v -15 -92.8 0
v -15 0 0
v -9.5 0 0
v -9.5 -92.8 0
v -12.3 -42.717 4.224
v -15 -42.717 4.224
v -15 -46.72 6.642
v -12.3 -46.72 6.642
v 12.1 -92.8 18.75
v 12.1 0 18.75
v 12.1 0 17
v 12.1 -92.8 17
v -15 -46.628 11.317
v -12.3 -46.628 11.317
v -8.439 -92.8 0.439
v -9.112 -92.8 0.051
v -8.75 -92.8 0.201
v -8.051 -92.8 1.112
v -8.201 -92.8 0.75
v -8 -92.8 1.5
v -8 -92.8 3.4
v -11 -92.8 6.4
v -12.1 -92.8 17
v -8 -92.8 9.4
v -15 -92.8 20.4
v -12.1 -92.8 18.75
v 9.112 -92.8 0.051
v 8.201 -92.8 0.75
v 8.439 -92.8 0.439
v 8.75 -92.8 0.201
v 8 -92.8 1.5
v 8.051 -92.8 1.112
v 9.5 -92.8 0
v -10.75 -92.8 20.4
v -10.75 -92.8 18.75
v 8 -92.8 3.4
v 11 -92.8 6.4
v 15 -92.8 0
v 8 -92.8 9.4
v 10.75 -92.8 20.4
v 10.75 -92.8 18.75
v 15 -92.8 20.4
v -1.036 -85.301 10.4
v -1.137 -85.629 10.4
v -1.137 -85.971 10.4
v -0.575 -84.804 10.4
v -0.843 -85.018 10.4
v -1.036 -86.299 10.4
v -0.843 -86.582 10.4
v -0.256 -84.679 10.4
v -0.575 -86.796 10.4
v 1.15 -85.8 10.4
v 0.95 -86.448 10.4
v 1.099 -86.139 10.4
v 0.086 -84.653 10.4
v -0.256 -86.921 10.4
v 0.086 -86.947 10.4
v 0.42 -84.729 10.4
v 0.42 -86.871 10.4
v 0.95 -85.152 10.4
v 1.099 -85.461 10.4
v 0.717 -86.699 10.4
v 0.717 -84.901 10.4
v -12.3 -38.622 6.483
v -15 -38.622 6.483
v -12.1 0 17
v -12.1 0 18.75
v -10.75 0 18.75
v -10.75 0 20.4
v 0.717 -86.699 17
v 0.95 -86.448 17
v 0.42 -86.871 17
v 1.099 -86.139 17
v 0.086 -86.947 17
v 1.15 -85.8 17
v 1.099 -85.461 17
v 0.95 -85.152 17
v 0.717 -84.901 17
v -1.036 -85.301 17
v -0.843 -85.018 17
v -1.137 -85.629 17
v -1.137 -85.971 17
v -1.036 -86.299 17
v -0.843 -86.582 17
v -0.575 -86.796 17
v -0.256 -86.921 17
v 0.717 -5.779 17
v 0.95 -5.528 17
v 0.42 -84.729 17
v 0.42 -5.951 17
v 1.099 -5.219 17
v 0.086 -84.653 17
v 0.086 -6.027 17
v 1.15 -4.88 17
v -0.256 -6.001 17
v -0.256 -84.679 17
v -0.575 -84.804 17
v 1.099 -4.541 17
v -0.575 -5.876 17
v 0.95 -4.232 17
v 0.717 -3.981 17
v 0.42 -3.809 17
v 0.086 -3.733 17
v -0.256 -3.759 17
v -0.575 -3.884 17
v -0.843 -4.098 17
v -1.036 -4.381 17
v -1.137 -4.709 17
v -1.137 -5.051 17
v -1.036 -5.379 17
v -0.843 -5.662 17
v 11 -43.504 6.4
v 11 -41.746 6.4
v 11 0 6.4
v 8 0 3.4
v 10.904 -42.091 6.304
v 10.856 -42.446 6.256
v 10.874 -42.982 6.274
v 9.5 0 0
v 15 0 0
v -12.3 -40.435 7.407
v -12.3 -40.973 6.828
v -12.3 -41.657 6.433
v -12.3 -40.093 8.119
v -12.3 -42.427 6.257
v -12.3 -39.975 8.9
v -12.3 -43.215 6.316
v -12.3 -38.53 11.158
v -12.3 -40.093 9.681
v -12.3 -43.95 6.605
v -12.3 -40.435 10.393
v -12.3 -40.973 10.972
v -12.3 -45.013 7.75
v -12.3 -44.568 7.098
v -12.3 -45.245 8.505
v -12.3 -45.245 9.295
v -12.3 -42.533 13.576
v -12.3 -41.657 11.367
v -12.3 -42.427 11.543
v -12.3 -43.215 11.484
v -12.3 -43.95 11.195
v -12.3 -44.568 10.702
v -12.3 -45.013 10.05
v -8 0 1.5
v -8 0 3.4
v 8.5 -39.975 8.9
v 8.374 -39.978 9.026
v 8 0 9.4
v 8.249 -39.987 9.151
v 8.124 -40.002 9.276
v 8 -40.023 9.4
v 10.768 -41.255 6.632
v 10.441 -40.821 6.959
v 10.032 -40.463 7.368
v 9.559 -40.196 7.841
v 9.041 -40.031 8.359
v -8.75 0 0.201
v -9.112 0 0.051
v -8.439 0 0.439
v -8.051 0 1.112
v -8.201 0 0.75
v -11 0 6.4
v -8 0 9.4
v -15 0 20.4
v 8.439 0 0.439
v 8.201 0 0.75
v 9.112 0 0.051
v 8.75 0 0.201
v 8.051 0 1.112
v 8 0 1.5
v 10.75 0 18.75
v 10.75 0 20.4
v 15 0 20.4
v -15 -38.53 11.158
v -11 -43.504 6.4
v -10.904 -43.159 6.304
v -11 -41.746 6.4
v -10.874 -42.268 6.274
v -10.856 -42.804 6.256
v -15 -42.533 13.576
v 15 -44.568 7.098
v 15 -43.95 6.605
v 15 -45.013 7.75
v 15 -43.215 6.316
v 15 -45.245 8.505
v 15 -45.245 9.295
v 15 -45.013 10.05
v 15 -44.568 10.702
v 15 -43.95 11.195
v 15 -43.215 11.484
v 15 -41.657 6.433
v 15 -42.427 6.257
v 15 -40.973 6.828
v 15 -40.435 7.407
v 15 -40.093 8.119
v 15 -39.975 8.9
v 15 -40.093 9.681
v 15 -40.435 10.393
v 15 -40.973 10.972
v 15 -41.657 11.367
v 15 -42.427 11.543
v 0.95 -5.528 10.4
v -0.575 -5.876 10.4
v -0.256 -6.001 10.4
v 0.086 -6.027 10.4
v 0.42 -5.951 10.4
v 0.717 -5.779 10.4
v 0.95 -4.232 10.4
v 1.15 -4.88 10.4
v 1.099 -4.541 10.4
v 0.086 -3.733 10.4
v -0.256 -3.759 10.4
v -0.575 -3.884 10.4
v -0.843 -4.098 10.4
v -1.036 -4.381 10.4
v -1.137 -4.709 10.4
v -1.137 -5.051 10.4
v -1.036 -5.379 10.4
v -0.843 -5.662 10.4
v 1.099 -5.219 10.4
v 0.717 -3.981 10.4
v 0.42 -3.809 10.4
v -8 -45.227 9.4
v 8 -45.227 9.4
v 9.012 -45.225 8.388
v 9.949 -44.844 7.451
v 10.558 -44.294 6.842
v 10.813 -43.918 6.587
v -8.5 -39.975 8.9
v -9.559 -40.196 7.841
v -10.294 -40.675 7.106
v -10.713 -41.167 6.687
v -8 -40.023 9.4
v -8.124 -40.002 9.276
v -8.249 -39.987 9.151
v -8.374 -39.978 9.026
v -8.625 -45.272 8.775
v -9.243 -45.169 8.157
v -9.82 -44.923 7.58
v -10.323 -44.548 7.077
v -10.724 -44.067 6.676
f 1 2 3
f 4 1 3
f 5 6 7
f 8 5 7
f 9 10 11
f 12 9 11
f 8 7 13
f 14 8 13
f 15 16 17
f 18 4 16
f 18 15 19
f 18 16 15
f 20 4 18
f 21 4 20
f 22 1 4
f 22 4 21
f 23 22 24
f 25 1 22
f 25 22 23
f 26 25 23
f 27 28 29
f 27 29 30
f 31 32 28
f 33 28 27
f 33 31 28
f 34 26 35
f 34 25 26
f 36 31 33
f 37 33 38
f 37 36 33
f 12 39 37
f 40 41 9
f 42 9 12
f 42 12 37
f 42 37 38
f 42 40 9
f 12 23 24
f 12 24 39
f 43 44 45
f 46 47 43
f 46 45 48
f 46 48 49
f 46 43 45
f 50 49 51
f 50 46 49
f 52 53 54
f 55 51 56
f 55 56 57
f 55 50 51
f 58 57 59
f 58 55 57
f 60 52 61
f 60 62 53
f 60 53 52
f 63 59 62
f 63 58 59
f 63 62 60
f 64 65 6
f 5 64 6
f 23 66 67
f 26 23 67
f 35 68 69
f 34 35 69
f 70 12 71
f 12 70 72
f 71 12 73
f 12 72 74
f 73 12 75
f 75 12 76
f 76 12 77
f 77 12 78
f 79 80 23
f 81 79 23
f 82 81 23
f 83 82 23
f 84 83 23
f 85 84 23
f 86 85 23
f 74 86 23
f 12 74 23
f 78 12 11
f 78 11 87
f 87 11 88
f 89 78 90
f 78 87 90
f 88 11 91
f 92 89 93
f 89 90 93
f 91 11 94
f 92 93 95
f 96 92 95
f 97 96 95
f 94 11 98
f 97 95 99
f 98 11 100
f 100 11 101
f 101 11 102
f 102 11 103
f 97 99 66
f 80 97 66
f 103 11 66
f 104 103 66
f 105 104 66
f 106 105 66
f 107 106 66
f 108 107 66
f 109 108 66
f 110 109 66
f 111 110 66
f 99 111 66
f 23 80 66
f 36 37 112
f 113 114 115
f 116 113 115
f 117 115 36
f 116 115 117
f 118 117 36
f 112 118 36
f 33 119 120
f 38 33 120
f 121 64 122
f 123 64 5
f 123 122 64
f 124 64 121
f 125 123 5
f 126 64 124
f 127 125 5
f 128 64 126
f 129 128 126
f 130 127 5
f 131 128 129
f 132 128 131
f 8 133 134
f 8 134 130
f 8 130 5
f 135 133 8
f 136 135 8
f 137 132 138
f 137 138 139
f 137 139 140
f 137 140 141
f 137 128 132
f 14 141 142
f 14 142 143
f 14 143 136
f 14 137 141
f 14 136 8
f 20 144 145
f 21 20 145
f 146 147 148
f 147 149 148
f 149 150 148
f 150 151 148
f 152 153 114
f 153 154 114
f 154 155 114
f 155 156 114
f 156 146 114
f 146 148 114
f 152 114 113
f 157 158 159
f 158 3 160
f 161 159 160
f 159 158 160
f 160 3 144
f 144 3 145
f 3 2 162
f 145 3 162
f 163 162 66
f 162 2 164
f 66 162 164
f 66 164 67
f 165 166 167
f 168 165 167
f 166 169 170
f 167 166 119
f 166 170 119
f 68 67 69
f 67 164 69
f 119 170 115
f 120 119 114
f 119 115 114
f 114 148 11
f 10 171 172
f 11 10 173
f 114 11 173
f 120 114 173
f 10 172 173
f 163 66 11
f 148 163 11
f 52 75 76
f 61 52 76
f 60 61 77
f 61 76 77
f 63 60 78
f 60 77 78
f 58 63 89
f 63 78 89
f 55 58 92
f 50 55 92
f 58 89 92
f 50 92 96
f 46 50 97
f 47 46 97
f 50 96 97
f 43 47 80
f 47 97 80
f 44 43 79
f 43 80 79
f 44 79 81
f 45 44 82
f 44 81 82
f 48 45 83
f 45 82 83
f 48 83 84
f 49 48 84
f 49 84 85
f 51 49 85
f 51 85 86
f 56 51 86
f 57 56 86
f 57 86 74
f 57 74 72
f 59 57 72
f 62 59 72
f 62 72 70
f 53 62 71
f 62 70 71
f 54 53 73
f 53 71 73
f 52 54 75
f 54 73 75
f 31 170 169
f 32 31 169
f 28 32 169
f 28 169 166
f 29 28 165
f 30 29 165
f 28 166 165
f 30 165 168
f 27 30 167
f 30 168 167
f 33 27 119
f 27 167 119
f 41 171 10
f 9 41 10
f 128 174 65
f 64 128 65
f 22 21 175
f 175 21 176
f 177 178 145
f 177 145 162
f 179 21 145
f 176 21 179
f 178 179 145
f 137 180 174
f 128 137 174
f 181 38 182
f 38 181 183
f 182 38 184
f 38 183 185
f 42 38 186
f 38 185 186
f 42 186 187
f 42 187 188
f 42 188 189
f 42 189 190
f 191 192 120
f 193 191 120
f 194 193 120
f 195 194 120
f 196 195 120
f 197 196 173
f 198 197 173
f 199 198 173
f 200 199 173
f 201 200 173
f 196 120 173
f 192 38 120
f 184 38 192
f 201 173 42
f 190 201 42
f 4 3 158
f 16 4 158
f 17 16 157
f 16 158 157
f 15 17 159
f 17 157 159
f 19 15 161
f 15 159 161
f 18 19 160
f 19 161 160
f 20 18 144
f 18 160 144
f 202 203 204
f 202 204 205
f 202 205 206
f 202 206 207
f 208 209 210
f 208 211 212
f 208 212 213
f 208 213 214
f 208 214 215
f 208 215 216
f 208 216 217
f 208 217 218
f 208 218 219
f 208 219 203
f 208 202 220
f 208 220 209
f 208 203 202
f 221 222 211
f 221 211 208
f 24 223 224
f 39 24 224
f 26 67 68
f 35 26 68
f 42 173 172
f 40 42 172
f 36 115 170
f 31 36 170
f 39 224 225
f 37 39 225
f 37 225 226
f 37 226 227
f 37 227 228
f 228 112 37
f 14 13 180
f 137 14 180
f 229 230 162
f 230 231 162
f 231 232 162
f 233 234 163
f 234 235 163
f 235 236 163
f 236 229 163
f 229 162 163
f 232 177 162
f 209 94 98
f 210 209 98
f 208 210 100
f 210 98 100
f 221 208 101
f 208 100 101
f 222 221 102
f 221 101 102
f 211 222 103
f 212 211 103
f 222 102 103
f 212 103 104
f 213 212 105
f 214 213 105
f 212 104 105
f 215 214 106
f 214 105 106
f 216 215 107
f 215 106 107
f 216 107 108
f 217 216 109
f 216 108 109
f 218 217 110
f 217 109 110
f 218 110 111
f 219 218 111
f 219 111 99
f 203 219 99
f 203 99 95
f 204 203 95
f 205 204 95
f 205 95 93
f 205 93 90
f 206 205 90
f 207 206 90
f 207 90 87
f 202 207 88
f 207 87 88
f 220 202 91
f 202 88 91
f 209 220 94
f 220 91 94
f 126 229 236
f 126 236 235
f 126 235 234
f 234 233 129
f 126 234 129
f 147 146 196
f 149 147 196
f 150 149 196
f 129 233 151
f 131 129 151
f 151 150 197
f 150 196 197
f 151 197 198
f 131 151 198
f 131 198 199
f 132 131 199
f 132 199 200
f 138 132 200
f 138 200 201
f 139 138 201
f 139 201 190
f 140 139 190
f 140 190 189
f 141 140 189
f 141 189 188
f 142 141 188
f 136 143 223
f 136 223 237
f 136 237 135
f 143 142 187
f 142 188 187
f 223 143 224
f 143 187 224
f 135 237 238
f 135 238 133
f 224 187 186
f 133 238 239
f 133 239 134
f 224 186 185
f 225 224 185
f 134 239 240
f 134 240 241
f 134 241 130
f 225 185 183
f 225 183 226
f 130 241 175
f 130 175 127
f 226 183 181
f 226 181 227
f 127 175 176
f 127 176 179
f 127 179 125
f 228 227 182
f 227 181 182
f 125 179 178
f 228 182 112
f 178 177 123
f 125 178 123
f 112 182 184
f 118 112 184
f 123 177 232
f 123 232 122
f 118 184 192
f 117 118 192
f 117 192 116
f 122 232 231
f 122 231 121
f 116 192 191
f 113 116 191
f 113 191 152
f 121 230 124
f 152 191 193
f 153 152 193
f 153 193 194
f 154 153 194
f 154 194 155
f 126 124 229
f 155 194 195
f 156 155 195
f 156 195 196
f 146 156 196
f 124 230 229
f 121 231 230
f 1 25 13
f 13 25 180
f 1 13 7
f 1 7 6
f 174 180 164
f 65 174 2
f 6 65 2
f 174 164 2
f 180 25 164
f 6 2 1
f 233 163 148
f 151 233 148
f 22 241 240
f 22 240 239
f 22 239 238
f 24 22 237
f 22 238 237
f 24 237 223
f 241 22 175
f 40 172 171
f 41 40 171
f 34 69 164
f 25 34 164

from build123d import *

# Parameters (mm, degrees)
F1_DEPTH = 92.8
F3_DEPTH = 92.8
F4_R     = 1.15
F5_DEPTH = 6.6
F6_R     = 2.65
F7_DEPTH = 30
F9_DEPTH = 2.7


with BuildPart() as f1:
    # F0 (on Front) → F1 (new body)
    with BuildSketch(Plane.XZ):
        with BuildLine():
            Line((-15, 20.4), (-15, 0))
            Line((-15, 0), (-9.5, 0))
            ThreePointArc((-9.5, 0), (-8.43934, 0.43934), (-8, 1.5))
            Line((-8, 1.5), (-8, 3.4))
            Line((-8, 3.4), (-9.5, 4.9))
            Line((-9.5, 4.9), (-11, 6.4))
            Line((-11, 6.4), (-9.5, 7.9))
            Line((-9.5, 7.9), (-8, 9.4))
            Line((-8, 9.4), (0, 9.4))
            Line((0, 9.4), (8, 9.4))
            Line((8, 9.4), (11, 6.4))
            Line((11, 6.4), (8, 3.4))
            Line((8, 3.4), (8, 1.5))
            ThreePointArc((8, 1.5), (8.43934, 0.43934), (9.5, 0))
            Line((9.5, 0), (15, 0))
            Line((15, 0), (15, 20.4))
            Line((15, 20.4), (0, 20.4))
            Line((0, 20.4), (-15, 20.4))
        make_face()
    extrude(amount=F1_DEPTH)

    # F2 (on face) → F3 (cut, through all)
    with BuildSketch(Plane(origin=(0, 0, 0), x_dir=(-1, 0, 0), z_dir=(0, 1, 0))):
        Polygon((0, 20.4), (-10.75, 20.4), (-10.75, 18.75), (-12.1, 18.75), (-12.1, 17), (0, 17), (12.1, 17), (12.1, 18.75), (10.75, 18.75), (10.75, 20.4), align=None)
    extrude(amount=-F3_DEPTH, mode=Mode.SUBTRACT)

    # F4 (on face) → F5 (cut)
    with BuildSketch(Plane.XY.offset(17)):
        with Locations((0, -4.88)):
            Circle(F4_R)
        with Locations((0, -85.8)):
            Circle(F4_R)
    extrude(amount=-F5_DEPTH, mode=Mode.SUBTRACT)

    # F6 (on face) → F7 (cut)
    with BuildSketch(Plane.YZ.offset(15)):
        with Locations((-42.625, 8.9)):
            Circle(F6_R)
    extrude(amount=-F7_DEPTH, mode=Mode.SUBTRACT)

    # F8 (on face) → F9 (cut)
    with BuildSketch(Plane(origin=(-15, 0, 0), x_dir=(0, -1, 0), z_dir=(-1, 0, 0))):
        Polygon((46.628252, 11.317431), (42.533069, 13.575634), (38.529817, 11.158202), (38.621748, 6.482569), (42.716931, 4.224366), (46.720183, 6.641798), align=None)
    extrude(amount=-F9_DEPTH, mode=Mode.SUBTRACT)


solid = f1.part
